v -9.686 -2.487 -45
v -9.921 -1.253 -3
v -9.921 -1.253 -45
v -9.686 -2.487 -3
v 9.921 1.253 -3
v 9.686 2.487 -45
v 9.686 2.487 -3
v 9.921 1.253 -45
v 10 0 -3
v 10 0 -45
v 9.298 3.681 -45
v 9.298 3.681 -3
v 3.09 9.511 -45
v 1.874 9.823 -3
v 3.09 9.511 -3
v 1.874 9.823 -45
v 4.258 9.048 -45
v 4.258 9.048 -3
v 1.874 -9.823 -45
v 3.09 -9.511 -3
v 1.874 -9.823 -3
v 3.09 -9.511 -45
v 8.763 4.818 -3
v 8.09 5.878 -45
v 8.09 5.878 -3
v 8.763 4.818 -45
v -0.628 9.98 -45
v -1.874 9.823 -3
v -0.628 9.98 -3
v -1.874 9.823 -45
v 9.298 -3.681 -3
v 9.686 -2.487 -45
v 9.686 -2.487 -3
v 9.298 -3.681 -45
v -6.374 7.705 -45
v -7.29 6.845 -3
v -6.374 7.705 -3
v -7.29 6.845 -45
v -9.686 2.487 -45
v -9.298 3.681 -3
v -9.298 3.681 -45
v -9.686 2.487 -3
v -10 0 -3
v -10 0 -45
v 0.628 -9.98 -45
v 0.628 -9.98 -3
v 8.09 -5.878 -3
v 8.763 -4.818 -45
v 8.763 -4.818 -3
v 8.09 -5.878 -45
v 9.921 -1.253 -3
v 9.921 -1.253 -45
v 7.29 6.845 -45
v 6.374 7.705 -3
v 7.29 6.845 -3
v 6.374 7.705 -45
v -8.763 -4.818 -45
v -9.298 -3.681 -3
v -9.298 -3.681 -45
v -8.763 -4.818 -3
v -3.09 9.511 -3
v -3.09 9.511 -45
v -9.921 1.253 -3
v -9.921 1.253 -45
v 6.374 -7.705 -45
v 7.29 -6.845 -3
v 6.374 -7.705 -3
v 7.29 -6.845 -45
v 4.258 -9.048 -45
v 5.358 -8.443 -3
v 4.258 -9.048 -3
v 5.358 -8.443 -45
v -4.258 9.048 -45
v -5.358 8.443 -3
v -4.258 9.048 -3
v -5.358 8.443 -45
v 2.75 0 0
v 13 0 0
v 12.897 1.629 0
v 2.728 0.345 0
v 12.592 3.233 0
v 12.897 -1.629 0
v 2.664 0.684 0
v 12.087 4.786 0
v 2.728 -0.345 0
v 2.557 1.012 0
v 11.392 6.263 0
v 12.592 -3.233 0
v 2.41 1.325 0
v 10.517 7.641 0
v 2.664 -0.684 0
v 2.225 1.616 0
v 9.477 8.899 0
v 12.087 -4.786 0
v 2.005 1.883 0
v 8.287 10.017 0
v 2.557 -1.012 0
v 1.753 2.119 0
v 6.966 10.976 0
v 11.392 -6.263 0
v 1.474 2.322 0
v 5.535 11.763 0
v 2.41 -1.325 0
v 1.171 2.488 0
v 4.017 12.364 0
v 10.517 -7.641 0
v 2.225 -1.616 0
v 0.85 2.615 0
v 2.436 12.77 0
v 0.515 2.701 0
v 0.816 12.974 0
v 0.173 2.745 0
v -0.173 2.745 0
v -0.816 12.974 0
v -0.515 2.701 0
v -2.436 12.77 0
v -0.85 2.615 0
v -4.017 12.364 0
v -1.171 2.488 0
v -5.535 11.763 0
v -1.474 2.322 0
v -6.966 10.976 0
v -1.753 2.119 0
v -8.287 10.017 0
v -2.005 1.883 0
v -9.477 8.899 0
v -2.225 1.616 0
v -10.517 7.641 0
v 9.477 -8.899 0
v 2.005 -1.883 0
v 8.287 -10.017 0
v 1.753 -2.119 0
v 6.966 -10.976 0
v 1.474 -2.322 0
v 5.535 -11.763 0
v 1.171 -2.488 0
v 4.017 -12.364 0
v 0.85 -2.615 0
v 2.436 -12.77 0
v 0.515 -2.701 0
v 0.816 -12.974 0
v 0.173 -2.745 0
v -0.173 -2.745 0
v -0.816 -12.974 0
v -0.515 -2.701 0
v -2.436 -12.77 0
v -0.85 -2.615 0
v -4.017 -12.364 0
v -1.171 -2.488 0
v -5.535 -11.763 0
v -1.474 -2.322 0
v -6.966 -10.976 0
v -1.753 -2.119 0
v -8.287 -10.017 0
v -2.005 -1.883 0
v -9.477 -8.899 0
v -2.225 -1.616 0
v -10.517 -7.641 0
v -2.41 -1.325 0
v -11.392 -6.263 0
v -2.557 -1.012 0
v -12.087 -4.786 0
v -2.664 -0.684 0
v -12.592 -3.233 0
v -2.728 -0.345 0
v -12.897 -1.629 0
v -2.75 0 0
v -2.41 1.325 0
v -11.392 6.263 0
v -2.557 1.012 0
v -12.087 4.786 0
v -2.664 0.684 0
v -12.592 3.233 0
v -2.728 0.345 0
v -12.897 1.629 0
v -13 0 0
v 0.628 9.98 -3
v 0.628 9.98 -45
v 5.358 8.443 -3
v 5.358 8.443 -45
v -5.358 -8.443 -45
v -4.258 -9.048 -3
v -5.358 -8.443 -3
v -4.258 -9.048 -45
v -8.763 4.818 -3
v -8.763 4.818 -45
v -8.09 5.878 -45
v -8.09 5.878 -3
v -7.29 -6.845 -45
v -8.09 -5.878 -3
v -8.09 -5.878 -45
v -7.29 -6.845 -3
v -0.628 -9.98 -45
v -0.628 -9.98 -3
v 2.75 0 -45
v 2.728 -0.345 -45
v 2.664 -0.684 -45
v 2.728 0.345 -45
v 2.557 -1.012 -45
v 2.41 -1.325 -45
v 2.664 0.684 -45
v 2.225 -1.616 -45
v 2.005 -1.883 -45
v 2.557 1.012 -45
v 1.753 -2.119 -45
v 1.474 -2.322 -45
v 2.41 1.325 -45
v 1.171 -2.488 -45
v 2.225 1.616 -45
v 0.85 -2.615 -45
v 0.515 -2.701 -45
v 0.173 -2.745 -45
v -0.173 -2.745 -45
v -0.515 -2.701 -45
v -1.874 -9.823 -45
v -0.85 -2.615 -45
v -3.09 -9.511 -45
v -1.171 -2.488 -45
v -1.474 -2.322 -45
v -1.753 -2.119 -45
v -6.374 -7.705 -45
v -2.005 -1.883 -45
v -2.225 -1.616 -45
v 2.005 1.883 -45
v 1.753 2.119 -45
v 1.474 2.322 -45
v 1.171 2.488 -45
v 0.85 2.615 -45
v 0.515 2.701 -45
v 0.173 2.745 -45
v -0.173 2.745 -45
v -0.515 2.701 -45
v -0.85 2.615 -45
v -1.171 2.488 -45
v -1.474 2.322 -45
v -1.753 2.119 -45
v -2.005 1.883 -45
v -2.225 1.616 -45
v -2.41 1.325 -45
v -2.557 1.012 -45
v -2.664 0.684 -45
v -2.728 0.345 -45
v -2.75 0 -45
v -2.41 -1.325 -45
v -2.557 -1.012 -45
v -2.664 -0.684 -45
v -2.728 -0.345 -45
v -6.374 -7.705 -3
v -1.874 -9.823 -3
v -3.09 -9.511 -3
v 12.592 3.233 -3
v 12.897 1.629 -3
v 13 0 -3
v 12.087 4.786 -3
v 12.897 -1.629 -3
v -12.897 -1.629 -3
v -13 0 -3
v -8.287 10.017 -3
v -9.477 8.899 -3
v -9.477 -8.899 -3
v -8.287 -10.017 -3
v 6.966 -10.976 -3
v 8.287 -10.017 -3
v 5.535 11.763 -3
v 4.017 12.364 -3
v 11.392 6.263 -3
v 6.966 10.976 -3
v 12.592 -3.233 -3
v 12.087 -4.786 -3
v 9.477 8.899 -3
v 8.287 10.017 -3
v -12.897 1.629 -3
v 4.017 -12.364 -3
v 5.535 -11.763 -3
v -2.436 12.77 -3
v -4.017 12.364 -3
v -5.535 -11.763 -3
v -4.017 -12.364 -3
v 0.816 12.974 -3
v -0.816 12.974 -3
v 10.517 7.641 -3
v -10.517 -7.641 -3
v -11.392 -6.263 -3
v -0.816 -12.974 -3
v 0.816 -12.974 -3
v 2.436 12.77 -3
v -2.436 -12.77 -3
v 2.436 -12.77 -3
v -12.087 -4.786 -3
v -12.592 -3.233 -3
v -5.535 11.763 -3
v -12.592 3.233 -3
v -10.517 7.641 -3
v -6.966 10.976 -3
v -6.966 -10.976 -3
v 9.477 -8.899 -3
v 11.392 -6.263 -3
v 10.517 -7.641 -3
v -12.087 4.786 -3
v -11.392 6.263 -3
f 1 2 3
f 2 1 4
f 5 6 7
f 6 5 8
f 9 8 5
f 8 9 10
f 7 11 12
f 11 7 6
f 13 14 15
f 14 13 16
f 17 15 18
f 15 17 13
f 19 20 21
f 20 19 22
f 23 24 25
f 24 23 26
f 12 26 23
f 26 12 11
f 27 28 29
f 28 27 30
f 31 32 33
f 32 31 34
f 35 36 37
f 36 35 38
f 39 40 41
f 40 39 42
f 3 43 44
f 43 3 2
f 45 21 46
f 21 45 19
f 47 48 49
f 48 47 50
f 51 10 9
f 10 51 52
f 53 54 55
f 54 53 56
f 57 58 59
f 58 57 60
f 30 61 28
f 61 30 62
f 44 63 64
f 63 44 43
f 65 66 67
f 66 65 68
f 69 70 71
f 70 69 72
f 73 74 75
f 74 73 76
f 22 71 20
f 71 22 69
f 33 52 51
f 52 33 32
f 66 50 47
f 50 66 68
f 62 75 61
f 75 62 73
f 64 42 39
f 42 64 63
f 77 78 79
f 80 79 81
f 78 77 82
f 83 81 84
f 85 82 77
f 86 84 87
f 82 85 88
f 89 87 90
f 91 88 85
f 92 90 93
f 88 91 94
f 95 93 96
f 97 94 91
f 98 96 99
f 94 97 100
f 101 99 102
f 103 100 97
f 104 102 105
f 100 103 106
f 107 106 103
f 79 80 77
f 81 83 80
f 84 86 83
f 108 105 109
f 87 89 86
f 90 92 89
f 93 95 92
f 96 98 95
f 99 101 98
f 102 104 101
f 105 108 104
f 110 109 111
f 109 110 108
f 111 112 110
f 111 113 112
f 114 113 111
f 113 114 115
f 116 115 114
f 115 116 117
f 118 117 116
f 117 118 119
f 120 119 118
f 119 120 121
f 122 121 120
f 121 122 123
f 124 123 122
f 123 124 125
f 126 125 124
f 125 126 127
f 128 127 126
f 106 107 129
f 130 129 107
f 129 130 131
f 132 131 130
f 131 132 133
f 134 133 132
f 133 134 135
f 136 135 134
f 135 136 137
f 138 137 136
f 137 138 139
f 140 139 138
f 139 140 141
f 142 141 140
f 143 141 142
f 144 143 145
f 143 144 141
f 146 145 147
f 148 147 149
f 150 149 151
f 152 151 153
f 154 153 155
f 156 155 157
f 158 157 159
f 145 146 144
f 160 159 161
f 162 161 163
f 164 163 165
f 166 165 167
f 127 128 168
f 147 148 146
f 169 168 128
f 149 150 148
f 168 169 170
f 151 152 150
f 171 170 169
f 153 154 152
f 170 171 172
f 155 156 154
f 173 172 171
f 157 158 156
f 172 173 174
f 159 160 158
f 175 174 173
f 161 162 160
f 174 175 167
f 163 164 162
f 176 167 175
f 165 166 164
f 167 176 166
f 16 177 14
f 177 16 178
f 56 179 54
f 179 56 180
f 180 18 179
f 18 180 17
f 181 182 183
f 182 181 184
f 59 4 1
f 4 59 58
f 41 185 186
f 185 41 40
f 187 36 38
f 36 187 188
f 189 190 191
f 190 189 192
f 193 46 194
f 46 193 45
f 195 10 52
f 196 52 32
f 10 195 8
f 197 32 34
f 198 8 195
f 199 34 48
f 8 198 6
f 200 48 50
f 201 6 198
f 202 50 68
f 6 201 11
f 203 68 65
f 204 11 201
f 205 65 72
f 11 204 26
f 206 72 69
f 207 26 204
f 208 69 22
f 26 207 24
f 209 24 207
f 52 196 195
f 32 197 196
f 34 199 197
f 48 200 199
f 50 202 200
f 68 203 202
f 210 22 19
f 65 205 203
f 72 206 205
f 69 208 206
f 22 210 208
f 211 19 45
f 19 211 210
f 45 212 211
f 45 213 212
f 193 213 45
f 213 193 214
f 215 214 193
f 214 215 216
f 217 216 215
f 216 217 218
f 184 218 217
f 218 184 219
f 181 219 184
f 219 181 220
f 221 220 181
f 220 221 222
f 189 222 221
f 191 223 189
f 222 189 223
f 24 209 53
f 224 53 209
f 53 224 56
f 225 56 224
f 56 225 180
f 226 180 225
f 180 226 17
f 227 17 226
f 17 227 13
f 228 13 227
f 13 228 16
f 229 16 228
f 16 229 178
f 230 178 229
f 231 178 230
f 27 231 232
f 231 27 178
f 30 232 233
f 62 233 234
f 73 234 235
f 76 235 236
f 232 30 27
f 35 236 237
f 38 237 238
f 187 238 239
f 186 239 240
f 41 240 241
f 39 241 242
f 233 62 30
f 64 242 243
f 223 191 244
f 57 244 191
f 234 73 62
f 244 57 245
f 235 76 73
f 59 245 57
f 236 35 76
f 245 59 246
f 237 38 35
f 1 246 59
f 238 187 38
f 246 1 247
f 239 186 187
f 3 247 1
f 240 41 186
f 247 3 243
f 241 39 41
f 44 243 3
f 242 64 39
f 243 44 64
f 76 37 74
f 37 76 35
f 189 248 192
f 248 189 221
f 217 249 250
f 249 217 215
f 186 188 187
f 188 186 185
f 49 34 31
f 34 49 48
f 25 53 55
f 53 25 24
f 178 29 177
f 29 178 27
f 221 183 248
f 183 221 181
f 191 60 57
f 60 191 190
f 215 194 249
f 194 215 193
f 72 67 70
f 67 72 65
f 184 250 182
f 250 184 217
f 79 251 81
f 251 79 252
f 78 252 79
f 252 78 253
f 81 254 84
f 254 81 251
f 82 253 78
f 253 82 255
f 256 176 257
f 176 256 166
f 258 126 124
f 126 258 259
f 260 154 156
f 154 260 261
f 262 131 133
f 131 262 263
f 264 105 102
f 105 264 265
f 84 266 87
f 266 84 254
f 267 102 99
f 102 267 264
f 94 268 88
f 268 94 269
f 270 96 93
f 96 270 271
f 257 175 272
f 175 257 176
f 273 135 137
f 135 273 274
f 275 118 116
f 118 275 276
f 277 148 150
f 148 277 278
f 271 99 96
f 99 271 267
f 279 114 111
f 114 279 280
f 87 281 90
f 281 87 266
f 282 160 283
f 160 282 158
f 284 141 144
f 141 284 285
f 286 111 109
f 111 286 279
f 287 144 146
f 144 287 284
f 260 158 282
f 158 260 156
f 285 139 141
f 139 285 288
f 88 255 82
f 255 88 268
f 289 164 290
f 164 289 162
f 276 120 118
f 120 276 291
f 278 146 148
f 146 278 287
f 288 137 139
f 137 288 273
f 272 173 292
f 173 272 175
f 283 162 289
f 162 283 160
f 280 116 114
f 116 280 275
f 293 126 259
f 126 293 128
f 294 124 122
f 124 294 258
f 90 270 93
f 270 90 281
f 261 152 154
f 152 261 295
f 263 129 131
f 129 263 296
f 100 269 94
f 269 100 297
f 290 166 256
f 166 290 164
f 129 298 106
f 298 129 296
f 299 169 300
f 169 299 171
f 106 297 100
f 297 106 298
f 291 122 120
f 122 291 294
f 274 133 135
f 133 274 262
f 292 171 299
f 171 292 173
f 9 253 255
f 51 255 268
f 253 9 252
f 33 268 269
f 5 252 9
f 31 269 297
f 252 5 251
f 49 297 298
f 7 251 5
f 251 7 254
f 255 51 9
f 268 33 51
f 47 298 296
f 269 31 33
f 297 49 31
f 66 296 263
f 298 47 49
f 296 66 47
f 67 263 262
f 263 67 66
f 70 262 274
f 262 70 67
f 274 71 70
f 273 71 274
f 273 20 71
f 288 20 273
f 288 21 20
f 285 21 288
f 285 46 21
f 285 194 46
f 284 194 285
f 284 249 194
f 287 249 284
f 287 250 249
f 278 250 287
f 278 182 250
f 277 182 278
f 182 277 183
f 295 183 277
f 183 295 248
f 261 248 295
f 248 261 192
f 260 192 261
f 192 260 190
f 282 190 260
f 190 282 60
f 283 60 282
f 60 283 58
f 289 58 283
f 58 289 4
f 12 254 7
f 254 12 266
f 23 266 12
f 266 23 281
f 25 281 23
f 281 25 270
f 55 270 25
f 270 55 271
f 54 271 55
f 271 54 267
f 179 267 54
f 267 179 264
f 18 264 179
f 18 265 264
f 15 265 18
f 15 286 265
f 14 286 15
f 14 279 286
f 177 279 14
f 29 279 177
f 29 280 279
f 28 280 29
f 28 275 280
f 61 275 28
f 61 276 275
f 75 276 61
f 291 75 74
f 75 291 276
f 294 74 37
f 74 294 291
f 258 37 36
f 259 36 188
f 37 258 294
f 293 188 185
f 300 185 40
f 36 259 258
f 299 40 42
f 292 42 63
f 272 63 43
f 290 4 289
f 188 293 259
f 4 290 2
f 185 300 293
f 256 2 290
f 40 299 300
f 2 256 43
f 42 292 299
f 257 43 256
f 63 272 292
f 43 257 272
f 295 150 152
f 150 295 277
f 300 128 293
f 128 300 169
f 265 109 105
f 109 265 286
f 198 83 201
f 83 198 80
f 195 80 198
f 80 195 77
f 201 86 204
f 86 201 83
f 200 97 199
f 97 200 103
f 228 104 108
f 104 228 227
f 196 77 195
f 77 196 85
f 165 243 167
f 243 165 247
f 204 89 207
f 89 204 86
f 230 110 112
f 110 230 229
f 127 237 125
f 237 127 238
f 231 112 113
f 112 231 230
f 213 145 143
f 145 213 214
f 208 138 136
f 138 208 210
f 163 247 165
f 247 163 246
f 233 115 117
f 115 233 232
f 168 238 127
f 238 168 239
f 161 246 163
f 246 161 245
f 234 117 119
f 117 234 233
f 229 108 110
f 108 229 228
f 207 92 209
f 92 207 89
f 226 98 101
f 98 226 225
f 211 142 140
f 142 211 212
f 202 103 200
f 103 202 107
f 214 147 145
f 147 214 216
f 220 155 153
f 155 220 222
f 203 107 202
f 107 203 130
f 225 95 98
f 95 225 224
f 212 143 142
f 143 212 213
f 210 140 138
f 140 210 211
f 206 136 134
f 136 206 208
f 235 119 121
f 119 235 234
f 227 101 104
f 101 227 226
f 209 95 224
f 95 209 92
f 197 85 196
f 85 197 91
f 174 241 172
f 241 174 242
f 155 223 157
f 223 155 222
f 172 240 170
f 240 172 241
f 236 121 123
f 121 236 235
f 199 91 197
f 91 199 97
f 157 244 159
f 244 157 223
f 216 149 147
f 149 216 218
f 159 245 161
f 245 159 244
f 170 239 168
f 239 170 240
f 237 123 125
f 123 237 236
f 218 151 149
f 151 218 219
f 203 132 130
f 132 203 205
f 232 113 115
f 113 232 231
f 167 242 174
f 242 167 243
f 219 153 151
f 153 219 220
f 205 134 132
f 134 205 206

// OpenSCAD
$fn = 50;


difference() {
	union() {
		translate(v = [0, 0, -45.0000000000]) {
			cylinder(h = 45, r = 10.0000000000);
		}
		translate(v = [0, 0, -3.0000000000]) {
			cylinder(h = 3, r = 13.0000000000);
		}
	}
	union() {
		#translate(v = [0, 0, -45]) {
			cylinder(h = 45, r = 2.7500000000);
		}
	}
}
